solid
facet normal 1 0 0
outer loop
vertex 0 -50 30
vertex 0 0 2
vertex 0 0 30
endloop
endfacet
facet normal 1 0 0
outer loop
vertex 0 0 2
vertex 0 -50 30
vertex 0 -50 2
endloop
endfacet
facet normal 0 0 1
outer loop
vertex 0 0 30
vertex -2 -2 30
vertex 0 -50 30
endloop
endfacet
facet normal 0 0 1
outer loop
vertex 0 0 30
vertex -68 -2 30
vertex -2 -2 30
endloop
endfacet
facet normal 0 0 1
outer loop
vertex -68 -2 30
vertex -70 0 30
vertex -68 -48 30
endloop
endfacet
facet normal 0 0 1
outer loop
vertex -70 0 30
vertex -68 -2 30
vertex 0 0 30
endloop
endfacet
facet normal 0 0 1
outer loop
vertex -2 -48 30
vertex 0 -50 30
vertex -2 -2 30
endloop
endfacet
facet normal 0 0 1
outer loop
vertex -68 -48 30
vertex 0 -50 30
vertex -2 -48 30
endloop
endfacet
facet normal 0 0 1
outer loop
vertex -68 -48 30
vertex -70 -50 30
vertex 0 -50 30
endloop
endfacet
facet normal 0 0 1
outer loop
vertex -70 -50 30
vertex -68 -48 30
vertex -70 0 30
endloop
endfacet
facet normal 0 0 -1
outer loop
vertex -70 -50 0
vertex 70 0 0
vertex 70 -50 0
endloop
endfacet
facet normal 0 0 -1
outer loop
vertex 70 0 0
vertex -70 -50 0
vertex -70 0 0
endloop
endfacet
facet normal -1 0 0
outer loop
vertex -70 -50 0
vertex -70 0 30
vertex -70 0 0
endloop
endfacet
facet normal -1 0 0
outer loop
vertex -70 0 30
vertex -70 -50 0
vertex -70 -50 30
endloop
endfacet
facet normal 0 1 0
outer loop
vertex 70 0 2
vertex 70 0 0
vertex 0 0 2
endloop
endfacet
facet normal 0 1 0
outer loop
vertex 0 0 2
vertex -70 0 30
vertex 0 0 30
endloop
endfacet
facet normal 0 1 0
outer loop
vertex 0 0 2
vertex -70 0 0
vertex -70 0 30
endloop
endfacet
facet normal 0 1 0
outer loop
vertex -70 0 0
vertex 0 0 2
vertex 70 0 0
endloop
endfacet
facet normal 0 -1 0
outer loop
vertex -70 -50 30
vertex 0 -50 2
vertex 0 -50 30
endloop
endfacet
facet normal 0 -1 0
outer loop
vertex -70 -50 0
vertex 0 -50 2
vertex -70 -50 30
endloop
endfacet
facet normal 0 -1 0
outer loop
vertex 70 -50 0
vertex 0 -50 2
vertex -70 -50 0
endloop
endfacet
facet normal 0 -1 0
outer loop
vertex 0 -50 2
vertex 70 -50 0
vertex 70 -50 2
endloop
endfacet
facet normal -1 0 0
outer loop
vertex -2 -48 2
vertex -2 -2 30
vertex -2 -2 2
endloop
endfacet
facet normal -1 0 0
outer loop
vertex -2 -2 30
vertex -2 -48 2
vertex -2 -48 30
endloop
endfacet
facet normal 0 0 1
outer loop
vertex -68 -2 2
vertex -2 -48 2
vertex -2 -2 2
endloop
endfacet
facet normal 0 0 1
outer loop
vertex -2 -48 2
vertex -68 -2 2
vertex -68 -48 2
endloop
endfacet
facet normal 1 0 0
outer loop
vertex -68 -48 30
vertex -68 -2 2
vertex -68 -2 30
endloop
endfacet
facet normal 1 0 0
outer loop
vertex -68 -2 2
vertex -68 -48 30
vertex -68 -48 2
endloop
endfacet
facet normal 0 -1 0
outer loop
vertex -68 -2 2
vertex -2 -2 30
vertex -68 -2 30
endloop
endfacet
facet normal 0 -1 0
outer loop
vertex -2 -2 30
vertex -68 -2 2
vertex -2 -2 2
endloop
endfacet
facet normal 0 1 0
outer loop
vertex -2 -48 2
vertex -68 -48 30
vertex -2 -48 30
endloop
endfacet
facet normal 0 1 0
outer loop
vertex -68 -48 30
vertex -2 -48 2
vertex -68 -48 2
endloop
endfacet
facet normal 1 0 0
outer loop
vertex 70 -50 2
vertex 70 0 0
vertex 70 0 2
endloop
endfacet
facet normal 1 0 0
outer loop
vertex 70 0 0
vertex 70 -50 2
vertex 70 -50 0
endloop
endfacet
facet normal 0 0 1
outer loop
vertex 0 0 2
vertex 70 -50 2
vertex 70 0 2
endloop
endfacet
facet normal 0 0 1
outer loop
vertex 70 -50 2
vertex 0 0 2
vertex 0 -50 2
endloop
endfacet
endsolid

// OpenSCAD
// Built by bench/smallmodels/features/compiler.py from a list of features.
$fn = 64;
difference() {
  union() {
    translate([-35, -25, 0]) translate([-35, -25, 0]) cube([70, 50, 30]);
  }
  translate([-68, -48, 2]) cube([66, 46, 29]);  // shell, wall 2, open top
}
union() {
    translate([35, -25, 0]) translate([-35, -25, 0]) cube([70, 50, 2]);
  }
